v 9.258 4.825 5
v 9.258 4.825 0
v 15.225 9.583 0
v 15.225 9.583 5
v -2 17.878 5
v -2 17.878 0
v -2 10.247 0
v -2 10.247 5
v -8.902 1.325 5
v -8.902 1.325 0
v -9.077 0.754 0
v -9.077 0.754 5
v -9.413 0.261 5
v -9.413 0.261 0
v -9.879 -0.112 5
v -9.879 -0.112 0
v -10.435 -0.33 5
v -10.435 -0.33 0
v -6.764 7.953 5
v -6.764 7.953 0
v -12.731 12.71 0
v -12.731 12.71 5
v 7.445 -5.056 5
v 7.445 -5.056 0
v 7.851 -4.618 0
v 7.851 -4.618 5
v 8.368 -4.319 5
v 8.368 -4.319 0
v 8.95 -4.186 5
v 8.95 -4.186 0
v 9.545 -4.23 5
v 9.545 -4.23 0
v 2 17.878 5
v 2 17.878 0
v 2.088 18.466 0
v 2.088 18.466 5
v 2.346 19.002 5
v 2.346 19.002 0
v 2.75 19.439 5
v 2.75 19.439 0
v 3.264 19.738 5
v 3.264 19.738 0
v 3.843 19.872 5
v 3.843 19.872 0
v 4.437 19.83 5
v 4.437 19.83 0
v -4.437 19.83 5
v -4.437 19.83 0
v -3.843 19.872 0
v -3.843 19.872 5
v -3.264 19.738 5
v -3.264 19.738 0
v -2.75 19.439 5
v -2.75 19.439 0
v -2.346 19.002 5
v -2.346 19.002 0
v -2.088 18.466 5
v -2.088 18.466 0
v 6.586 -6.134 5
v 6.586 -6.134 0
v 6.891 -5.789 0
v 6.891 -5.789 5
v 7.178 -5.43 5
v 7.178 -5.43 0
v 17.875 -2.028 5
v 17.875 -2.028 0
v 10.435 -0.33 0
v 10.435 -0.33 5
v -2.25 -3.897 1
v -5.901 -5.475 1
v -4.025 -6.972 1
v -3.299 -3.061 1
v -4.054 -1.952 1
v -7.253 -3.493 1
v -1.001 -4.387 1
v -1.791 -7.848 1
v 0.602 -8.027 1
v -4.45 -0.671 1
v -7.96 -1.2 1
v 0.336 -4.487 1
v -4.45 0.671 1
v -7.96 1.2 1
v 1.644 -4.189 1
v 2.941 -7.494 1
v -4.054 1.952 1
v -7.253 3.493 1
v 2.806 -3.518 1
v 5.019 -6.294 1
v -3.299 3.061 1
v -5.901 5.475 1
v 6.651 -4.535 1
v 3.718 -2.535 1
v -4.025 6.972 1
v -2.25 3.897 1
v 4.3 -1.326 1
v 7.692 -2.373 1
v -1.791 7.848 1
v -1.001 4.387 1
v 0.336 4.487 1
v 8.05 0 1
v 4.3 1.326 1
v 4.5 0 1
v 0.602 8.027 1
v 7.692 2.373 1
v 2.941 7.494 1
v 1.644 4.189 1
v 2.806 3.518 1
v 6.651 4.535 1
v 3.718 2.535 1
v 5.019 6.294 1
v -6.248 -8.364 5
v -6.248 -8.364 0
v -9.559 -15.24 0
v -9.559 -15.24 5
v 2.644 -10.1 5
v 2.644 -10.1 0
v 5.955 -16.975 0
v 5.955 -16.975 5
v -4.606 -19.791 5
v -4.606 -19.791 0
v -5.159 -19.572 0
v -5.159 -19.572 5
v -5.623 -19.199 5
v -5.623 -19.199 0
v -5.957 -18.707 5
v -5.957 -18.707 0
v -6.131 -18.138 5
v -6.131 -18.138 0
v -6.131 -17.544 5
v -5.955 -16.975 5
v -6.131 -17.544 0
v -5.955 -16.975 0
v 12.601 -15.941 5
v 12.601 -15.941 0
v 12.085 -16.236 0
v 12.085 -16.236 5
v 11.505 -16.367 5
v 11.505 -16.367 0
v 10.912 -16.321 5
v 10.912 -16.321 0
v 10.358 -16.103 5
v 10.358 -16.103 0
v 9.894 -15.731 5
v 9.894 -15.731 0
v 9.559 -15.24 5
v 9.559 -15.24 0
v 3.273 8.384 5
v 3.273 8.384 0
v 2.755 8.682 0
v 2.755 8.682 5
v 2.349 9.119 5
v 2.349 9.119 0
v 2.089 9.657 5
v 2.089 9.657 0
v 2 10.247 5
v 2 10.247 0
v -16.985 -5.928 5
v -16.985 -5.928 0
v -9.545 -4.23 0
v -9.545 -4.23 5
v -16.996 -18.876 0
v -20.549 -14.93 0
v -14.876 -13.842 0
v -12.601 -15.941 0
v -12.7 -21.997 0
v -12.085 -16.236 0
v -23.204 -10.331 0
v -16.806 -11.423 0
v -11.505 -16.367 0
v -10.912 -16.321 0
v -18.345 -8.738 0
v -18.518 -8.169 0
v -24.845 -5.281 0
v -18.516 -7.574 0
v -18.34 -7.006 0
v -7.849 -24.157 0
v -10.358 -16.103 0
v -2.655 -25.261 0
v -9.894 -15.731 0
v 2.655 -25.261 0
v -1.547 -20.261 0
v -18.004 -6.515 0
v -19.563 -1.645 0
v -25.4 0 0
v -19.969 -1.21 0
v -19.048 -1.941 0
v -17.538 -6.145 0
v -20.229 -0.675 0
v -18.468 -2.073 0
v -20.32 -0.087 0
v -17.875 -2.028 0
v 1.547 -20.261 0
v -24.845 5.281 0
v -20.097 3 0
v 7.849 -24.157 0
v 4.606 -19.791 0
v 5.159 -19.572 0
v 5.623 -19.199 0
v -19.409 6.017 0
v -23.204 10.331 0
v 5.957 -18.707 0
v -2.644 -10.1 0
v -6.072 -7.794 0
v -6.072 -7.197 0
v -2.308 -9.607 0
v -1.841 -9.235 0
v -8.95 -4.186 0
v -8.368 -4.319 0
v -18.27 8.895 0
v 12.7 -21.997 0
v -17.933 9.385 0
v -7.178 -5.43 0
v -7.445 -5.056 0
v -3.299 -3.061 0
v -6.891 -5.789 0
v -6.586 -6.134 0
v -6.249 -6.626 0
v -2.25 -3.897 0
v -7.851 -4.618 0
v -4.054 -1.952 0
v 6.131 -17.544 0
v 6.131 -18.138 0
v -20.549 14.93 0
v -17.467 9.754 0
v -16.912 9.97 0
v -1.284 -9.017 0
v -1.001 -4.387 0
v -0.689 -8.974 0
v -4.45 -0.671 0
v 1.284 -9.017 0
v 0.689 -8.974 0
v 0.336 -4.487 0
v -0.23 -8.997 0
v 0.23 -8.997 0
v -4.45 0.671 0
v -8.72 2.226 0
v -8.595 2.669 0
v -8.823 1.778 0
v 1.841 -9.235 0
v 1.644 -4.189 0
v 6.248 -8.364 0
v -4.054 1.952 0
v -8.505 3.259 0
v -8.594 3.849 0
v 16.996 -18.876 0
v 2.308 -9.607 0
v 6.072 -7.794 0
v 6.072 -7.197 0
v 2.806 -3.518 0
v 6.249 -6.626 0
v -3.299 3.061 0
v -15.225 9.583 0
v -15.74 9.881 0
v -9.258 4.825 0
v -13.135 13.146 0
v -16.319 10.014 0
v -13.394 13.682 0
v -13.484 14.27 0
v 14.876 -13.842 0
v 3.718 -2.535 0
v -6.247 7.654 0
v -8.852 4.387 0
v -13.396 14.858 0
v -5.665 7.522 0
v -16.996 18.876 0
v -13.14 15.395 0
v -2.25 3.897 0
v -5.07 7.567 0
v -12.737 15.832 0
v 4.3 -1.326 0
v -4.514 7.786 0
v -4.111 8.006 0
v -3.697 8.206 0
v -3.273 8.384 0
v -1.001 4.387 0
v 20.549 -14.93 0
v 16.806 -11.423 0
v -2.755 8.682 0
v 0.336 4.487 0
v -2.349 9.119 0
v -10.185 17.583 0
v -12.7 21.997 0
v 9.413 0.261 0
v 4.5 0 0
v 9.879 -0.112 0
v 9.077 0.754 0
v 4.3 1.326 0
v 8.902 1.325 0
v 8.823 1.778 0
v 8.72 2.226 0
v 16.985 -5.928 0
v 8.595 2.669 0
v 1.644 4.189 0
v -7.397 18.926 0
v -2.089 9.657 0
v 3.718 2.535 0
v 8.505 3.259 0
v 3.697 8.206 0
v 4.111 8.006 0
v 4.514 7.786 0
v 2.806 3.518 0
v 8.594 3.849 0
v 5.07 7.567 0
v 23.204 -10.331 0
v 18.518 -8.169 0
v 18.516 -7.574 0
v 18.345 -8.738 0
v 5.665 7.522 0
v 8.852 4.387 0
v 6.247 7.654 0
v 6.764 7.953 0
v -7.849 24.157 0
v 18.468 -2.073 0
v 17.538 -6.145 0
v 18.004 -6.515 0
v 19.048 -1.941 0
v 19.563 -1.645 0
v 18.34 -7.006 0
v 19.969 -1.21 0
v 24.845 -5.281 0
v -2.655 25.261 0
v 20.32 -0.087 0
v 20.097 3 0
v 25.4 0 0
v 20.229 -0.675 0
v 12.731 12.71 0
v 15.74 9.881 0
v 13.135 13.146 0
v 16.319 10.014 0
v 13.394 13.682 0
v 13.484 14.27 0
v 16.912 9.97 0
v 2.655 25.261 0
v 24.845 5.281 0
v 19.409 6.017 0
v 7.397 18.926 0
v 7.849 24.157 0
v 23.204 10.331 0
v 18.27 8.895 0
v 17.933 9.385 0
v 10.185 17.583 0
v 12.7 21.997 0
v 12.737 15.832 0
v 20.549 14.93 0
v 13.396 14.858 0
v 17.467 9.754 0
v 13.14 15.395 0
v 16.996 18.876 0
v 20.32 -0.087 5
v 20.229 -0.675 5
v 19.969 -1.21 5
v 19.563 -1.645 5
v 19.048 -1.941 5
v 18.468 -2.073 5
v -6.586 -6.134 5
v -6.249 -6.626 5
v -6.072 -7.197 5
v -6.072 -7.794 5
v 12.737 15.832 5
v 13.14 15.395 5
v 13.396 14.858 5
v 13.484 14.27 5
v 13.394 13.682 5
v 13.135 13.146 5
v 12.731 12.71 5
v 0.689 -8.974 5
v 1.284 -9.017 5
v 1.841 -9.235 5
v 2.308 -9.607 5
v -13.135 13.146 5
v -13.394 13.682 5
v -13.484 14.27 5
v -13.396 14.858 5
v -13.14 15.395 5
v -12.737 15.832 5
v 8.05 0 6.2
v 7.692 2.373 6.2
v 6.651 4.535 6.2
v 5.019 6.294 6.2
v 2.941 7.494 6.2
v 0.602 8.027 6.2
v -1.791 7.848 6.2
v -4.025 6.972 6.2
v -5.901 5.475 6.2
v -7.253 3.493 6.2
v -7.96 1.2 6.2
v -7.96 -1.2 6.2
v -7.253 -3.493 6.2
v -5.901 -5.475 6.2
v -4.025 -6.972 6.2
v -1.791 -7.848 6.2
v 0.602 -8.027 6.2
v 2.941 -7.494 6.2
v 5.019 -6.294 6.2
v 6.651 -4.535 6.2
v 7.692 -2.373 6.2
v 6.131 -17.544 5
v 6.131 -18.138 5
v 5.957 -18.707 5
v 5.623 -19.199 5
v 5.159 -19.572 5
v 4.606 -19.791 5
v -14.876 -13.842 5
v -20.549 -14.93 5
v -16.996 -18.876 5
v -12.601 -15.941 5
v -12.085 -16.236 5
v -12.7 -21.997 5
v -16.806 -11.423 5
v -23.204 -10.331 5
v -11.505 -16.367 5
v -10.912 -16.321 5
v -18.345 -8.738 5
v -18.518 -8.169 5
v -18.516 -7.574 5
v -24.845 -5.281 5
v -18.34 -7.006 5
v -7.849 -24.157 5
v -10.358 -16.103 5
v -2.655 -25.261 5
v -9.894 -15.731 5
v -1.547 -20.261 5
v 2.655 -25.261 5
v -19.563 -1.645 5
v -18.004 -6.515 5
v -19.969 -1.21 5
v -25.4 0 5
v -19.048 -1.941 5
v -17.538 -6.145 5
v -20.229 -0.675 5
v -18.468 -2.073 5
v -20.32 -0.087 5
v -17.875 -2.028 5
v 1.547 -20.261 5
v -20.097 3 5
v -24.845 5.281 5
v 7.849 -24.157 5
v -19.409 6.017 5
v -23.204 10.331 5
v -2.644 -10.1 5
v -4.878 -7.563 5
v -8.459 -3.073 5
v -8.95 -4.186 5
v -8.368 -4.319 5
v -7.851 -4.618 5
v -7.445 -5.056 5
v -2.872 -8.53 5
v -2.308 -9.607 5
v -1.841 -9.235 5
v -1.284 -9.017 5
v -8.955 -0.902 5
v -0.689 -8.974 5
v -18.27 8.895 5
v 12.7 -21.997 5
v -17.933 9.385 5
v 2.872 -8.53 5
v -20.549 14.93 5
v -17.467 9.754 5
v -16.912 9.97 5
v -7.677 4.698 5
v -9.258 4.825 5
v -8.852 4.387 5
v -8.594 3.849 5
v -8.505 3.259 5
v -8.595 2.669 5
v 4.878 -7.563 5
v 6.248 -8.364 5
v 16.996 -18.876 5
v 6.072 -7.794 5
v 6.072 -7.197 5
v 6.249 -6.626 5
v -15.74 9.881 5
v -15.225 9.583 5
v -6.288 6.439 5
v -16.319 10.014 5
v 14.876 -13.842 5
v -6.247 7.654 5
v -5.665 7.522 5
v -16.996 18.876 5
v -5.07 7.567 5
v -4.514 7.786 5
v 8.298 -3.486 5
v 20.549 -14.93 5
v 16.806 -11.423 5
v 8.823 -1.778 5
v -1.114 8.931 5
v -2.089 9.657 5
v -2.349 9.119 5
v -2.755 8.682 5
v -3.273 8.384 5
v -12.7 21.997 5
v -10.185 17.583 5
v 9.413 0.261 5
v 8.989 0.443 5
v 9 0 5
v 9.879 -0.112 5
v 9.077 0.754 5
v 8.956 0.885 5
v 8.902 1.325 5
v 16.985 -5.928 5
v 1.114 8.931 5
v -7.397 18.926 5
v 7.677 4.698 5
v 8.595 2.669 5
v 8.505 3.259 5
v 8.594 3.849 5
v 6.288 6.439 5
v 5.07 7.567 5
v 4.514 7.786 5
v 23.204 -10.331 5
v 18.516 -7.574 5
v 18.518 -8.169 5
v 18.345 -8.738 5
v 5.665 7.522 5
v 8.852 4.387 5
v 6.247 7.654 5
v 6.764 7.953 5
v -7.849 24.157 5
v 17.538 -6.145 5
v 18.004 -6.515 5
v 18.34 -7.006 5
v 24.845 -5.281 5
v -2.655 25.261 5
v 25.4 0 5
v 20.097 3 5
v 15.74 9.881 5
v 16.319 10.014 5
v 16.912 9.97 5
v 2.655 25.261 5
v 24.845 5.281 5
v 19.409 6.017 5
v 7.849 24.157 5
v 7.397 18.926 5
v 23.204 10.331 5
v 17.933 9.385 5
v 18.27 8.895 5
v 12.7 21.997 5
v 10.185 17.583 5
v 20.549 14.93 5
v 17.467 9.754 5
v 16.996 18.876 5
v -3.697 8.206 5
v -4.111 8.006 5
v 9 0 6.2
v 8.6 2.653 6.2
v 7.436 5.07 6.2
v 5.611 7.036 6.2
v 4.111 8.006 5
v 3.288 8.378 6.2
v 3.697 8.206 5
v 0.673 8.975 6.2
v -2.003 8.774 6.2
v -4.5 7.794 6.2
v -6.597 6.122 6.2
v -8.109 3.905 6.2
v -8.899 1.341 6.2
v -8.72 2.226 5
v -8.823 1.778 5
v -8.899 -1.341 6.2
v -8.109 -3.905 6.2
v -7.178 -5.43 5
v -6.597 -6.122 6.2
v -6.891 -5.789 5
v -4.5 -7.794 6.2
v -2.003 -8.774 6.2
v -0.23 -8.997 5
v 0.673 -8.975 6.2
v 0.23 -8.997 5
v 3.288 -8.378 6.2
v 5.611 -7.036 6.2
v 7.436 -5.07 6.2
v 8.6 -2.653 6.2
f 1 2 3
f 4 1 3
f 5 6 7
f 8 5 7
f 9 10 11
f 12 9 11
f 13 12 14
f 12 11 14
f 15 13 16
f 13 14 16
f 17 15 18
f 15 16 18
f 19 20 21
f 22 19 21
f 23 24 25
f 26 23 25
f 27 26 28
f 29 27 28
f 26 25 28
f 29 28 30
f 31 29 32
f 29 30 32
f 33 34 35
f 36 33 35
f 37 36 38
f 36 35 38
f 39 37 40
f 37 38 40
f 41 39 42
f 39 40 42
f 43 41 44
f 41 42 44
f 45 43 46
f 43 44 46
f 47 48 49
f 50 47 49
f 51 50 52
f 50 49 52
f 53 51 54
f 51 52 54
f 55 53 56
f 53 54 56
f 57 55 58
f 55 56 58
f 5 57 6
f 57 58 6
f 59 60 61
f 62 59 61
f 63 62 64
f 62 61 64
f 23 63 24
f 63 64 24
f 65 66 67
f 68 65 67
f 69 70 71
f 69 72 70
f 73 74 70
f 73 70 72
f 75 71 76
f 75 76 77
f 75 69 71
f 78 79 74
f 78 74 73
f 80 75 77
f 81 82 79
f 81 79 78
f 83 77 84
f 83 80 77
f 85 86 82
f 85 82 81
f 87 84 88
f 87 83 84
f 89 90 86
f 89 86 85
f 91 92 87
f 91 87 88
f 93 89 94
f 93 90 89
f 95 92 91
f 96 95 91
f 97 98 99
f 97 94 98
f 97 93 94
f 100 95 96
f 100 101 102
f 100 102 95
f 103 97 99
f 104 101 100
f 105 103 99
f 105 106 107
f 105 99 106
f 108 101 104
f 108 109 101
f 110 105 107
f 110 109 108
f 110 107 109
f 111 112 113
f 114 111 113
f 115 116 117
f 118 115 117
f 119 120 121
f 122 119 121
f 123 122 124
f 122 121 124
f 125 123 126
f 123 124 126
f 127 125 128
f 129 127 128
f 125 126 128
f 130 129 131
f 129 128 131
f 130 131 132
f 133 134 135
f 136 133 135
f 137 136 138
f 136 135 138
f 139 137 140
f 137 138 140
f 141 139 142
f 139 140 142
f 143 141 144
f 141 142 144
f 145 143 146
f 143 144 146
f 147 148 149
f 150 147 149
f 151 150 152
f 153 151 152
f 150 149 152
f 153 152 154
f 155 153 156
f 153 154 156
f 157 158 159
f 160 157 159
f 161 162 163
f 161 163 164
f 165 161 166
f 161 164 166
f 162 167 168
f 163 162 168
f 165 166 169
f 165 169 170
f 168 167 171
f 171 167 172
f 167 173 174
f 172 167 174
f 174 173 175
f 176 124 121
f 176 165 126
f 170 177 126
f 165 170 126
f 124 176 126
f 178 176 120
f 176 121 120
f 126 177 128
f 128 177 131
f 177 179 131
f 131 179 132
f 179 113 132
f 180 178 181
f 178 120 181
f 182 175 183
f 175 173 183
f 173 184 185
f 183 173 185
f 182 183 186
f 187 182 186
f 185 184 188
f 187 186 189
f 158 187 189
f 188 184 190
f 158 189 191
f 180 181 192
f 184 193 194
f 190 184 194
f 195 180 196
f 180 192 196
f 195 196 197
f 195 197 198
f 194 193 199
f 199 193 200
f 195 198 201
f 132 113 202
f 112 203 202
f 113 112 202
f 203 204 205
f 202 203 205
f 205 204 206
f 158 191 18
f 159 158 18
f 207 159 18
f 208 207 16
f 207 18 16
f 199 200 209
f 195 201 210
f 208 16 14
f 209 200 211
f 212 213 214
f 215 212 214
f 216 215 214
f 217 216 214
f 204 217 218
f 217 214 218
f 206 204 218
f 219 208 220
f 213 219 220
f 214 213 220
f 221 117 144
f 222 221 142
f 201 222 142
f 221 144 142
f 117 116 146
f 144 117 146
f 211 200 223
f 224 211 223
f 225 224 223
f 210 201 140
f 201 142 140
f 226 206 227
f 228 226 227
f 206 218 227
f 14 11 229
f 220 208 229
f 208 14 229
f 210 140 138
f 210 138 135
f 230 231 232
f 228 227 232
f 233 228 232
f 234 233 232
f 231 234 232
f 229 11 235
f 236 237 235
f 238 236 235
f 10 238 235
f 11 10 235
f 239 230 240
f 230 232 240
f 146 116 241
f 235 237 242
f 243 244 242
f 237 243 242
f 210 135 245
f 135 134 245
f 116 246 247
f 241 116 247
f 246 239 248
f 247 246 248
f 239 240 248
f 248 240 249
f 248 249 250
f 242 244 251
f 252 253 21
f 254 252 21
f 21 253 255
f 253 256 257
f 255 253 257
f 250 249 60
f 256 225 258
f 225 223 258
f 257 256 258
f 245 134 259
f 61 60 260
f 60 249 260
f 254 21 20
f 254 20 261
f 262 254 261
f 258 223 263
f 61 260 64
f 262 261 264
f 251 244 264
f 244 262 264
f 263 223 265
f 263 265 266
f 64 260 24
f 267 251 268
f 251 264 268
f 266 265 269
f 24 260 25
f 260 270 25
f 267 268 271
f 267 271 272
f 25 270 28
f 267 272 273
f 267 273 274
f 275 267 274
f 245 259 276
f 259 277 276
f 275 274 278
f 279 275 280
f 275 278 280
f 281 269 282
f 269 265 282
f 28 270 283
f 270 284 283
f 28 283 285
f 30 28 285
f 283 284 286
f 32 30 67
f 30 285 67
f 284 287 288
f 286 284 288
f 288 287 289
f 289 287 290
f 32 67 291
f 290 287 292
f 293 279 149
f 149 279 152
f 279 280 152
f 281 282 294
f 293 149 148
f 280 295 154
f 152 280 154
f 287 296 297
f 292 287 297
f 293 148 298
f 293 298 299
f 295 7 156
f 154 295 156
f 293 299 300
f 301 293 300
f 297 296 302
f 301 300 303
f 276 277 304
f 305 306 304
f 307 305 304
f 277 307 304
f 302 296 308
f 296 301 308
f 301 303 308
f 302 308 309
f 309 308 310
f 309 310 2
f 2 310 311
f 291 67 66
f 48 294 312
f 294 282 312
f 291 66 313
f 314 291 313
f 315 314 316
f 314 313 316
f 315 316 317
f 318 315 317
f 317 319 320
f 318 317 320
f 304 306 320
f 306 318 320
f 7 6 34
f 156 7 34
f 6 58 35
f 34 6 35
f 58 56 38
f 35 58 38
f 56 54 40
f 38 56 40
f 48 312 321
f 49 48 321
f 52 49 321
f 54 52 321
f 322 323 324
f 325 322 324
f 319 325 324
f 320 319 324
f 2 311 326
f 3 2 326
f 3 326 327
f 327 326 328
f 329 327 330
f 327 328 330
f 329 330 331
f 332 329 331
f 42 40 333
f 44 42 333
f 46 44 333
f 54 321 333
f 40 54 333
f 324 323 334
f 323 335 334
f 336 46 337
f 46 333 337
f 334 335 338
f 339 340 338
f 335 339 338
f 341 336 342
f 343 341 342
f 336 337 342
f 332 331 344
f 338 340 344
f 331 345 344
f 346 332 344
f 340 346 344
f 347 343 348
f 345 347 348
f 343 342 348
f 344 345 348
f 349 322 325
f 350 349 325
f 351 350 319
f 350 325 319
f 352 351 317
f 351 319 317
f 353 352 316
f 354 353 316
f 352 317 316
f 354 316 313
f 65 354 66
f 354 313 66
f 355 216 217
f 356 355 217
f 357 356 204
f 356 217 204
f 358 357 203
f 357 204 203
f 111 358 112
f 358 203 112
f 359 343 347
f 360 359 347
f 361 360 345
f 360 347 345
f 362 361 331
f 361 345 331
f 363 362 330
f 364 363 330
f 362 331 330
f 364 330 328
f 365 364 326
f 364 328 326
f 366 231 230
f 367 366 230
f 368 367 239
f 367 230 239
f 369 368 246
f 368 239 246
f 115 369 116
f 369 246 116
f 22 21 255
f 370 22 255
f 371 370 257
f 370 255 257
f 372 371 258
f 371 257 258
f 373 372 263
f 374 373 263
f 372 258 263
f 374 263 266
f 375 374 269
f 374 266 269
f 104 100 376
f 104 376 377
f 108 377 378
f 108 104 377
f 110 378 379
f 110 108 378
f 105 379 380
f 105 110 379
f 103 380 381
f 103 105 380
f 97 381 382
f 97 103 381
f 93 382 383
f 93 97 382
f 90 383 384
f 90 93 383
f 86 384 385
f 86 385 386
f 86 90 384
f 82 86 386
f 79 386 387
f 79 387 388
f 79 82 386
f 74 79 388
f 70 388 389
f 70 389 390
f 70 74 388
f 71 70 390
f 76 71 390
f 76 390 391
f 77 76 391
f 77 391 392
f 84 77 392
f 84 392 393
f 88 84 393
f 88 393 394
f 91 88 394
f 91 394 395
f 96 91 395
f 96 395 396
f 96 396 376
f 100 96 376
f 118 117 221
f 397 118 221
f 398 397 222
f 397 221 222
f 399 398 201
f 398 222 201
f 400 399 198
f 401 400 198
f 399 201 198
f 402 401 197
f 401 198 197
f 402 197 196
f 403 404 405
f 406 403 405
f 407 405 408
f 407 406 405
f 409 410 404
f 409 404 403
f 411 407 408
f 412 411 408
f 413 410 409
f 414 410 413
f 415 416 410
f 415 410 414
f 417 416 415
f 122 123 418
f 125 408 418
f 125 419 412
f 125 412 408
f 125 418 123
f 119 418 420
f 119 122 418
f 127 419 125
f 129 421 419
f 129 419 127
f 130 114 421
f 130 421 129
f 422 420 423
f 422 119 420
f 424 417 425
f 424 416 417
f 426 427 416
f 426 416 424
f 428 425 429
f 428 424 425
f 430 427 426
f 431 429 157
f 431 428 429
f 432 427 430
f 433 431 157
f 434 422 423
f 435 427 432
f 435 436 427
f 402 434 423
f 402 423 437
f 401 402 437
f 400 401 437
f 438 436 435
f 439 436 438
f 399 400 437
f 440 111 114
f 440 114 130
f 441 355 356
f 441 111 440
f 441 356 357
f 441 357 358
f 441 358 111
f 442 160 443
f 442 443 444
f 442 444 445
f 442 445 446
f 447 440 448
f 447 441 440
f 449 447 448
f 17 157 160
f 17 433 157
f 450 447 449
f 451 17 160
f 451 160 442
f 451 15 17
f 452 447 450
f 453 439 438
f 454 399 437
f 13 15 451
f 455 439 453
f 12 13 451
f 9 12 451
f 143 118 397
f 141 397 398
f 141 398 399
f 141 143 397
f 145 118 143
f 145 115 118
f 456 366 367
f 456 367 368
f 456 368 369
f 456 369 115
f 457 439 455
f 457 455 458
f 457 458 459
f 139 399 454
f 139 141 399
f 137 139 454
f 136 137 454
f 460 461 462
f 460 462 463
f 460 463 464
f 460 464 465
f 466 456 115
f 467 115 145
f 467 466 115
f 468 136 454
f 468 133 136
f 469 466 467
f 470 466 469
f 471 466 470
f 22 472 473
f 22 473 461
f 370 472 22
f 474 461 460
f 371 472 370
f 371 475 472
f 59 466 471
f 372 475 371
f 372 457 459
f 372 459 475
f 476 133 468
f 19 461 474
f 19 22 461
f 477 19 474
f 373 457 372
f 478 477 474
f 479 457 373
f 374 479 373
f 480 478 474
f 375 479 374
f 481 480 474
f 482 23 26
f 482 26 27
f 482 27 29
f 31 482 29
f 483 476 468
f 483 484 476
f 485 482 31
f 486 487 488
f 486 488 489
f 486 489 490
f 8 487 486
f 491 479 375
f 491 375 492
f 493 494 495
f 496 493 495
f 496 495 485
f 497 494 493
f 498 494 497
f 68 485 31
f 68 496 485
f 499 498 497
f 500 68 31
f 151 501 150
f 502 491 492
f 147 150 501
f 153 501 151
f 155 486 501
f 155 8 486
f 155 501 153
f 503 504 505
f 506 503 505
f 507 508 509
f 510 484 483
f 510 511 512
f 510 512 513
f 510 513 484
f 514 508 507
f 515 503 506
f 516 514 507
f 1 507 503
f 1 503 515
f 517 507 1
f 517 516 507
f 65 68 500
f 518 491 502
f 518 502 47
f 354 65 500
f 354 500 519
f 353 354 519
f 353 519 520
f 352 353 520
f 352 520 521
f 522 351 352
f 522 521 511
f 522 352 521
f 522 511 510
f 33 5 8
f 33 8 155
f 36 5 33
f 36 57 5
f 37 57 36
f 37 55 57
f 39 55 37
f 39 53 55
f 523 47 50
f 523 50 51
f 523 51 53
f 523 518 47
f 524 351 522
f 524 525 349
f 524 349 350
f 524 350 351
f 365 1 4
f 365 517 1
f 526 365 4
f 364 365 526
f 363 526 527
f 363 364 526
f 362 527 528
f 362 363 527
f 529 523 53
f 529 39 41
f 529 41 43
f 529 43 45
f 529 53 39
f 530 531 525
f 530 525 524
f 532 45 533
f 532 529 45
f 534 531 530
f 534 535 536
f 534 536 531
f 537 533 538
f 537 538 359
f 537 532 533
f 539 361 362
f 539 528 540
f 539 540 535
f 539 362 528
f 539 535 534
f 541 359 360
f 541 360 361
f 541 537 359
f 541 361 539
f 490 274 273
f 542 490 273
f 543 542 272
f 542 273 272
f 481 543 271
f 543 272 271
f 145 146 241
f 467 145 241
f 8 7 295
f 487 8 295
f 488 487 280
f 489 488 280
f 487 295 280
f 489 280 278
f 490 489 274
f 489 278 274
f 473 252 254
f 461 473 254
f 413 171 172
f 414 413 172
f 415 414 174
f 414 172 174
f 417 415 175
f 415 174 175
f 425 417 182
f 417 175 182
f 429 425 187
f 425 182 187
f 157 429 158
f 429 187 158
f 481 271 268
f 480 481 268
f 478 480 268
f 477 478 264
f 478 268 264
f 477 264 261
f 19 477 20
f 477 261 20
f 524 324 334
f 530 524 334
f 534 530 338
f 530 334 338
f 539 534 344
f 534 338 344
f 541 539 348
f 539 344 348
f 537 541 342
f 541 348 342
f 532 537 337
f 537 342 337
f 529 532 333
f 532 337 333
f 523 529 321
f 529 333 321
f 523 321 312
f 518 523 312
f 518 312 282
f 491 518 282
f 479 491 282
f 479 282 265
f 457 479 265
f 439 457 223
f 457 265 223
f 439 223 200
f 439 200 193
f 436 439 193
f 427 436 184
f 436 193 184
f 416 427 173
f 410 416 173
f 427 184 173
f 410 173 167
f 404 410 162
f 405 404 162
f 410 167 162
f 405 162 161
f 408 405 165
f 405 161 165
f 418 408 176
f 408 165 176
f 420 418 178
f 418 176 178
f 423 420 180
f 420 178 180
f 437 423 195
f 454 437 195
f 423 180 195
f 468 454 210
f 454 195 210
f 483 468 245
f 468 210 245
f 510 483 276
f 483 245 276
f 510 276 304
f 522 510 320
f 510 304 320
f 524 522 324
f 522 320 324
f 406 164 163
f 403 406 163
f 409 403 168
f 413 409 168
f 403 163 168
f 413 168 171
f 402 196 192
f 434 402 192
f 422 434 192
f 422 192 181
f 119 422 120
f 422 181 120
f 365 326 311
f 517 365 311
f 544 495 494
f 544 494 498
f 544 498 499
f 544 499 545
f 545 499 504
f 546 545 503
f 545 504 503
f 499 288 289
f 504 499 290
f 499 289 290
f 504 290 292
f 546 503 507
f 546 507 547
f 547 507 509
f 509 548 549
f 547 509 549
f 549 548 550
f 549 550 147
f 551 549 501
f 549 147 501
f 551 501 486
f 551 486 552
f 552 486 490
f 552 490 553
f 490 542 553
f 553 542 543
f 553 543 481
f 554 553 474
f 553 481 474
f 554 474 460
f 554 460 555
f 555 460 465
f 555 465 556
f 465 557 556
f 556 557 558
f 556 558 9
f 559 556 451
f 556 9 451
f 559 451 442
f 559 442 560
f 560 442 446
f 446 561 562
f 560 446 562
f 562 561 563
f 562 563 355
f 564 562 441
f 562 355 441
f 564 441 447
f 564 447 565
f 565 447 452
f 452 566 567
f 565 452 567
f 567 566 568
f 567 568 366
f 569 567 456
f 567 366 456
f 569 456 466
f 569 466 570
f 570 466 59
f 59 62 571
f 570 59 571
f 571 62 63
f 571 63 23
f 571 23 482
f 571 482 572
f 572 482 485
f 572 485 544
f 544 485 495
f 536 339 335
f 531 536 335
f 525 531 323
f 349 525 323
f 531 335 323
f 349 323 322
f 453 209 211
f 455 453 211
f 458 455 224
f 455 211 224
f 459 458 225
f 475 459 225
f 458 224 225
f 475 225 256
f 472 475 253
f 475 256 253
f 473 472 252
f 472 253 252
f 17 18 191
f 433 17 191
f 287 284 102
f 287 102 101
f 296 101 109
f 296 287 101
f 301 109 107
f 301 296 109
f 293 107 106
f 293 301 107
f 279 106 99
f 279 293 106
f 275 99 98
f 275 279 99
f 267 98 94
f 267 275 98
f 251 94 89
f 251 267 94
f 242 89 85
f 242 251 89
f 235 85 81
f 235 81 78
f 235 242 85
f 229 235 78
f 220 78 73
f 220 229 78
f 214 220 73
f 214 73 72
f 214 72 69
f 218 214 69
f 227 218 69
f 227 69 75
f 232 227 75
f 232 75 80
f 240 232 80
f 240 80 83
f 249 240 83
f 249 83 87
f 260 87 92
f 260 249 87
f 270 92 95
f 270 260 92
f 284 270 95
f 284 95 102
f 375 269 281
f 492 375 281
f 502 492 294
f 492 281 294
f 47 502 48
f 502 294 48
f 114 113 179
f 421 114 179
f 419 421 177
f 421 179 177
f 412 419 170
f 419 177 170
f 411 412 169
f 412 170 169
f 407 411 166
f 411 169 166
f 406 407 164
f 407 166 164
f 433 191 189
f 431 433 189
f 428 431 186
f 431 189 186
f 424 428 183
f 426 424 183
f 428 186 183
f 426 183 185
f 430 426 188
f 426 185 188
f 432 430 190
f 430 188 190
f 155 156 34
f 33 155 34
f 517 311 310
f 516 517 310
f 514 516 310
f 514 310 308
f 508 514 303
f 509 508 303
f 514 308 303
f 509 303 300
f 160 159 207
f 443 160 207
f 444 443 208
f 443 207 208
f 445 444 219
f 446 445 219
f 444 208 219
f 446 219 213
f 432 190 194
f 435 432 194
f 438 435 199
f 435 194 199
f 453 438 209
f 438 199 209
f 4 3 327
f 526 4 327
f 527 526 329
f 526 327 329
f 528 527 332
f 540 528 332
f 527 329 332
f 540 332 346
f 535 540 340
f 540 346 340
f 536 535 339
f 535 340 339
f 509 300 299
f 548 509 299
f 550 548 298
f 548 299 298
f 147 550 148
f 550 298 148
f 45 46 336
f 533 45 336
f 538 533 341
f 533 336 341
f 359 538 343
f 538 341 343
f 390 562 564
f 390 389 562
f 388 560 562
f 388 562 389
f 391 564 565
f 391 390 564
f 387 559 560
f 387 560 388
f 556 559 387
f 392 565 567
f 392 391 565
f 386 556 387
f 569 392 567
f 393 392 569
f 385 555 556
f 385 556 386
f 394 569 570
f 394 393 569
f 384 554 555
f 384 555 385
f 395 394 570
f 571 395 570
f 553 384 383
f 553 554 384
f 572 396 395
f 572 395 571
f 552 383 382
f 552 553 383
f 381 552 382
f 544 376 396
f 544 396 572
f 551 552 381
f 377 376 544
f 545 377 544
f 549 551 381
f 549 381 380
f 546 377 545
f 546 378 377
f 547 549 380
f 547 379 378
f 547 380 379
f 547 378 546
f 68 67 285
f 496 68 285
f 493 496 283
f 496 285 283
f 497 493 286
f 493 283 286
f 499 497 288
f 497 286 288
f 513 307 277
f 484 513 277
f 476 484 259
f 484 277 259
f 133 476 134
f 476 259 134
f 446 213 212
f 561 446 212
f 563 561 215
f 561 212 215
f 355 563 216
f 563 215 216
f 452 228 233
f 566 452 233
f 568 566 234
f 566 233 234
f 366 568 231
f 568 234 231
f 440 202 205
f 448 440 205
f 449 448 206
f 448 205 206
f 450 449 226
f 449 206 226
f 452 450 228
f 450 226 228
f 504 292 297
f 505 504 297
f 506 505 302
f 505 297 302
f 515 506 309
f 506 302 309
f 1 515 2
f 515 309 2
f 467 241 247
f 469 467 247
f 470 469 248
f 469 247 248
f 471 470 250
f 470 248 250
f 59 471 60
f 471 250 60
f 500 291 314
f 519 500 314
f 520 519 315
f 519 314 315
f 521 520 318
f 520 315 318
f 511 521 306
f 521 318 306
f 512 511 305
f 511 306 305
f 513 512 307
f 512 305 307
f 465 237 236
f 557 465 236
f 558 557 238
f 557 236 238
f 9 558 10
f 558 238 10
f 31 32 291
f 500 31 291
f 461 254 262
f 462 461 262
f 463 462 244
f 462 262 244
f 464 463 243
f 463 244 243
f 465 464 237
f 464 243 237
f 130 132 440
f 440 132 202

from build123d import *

# Parameters (mm, degrees)
F0_R     = 25.4
F0_R_2   = 8.1
F2_DEPTH = 5
F1_R     = 8.05
F1_R_2   = 4.5
F3_DEPTH = 1
F1_R_3   = 9
F4_DEPTH = 6.2


with BuildPart() as f2:
    # F0 (on Top) → F2 (new body)
    with BuildSketch(Plane.XY):
        Circle(F0_R)
        with BuildLine():
            ThreePointArc((-4.606486482, -19.7909747686), (-5.9568852552, -18.7069483477), (-5.955029879, -16.9752767029))
            Line((-5.955029879, -16.9752767029), (-2.6440475771, -10.0999511093))
            ThreePointArc((-2.6440475771, -10.0999511093), (-1.8405240839, -9.2347532099), (-0.688998961, -8.9735879353))
            ThreePointArc((-0.688998961, -8.9735879353), (0, -9), (0.688998961, -8.9735879353))
            ThreePointArc((0.688998961, -8.9735879353), (1.8405240839, -9.2347532099), (2.6440475771, -10.0999511093))
            Line((2.6440475771, -10.0999511093), (5.955029879, -16.9752767029))
            ThreePointArc((5.955029879, -16.9752767029), (5.9568852552, -18.7069483477), (4.606486482, -19.7909747686))
            ThreePointArc((4.606486482, -19.7909747686), (0, -20.32), (-4.606486482, -19.7909747686))
        make_face(mode=Mode.SUBTRACT)
        with BuildLine():
            ThreePointArc((-18.3453044867, -8.7379747819), (-18.3397383666, -7.0063110887), (-16.9847061493, -5.9280820695))
            Line((-16.9847061493, -5.9280820695), (-9.5449964486, -4.230016879))
            ThreePointArc((-9.5449964486, -4.230016879), (-8.3675687887, -4.318794776), (-7.4454173842, -5.0562594846))
            ThreePointArc((-7.4454173842, -5.0562594846), (-7.0364833422, -5.6114082167), (-6.5862497328, -6.1336216428))
            ThreePointArc((-6.5862497328, -6.1336216428), (-6.0724727959, -7.1967541221), (-6.2479230487, -8.3644161528))
            Line((-6.2479230487, -8.3644161528), (-9.5589053506, -15.2397417464))
            ThreePointArc((-9.5589053506, -15.2397417464), (-10.9116239517, -16.3208719487), (-12.6011097989, -15.9409670922))
            ThreePointArc((-12.6011097989, -15.9409670922), (-15.8868157238, -12.6693127738), (-18.3453044867, -8.7379747819))
        make_face(mode=Mode.SUBTRACT)
        Circle(F0_R_2, mode=Mode.SUBTRACT)
        with BuildLine():
            ThreePointArc((12.6011097989, -15.9409670922), (10.9116239517, -16.3208719487), (9.5589053506, -15.2397417464))
            Line((9.5589053506, -15.2397417464), (6.2479230487, -8.3644161528))
            ThreePointArc((6.2479230487, -8.3644161528), (6.0724727959, -7.1967541221), (6.5862497328, -6.1336216428))
            ThreePointArc((6.5862497328, -6.1336216428), (7.0364833422, -5.6114082167), (7.4454173842, -5.0562594846))
            ThreePointArc((7.4454173842, -5.0562594846), (8.3675687887, -4.318794776), (9.5449964486, -4.230016879))
            Line((9.5449964486, -4.230016879), (16.9847061493, -5.9280820695))
            ThreePointArc((16.9847061493, -5.9280820695), (18.3397383666, -7.0063110887), (18.3453044867, -8.7379747819))
            ThreePointArc((18.3453044867, -8.7379747819), (15.8868157238, -12.6693127738), (12.6011097989, -15.9409670922))
        make_face(mode=Mode.SUBTRACT)
        with BuildLine():
            ThreePointArc((-18.269734037, 8.8948984378), (-16.9123944255, 9.9702213228), (-15.2245522643, 9.583079273))
            Line((-15.2245522643, 9.583079273), (-9.2583683118, 4.8252063378))
            ThreePointArc((-9.2583683118, 4.8252063378), (-8.5936635283, 3.8493042116), (-8.5952846582, 2.6685354869))
            ThreePointArc((-8.5952846582, 2.6685354869), (-8.7743512096, 2.0026884056), (-8.9019180428, 1.3250868497))
            ThreePointArc((-8.9019180428, 1.3250868497), (-9.4127738045, 0.2605476067), (-10.4350801844, -0.3303052303))
            Line((-10.4350801844, -0.3303052303), (-17.8747898851, -2.0283704208))
            ThreePointArc((-17.8747898851, -2.0283704208), (-19.5634577664, -1.6448460872), (-20.3198133854, -0.087086059))
            ThreePointArc((-20.3198133854, -0.087086059), (-19.8105351755, 4.521625378), (-18.269734037, 8.8948984378))
        make_face(mode=Mode.SUBTRACT)
        with BuildLine():
            ThreePointArc((-2, 10.246950766), (-2.3485543523, 9.1187986163), (-3.2727272727, 8.3838688085))
            ThreePointArc((-3.2727272727, 8.3838688085), (-3.9049536521, 8.1087198111), (-4.5142605006, 7.7859779176))
            ThreePointArc((-4.5142605006, 7.7859779176), (-5.6650641528, 7.5216516734), (-6.7644091044, 7.9525322677))
            Line((-6.7644091044, 7.9525322677), (-12.7305930568, 12.7104052029))
            ThreePointArc((-12.7305930568, 12.7104052029), (-13.4836088612, 14.2697824267), (-12.7372830441, 15.832372553))
            ThreePointArc((-12.7372830441, 15.832372553), (-8.8165175789, 18.3076873958), (-4.4366812227, 19.8297317109))
            ThreePointArc((-4.4366812227, 19.8297317109), (-2.749672532, 19.4389737228), (-2, 17.8779864638))
            Line((-2, 17.8779864638), (-2, 10.246950766))
        make_face(mode=Mode.SUBTRACT)
        with BuildLine():
            ThreePointArc((20.3198133854, -0.087086059), (19.5634577664, -1.6448460872), (17.8747898851, -2.0283704208))
            Line((17.8747898851, -2.0283704208), (10.4350801844, -0.3303052303))
            ThreePointArc((10.4350801844, -0.3303052303), (9.4127738045, 0.2605476067), (8.9019180428, 1.3250868497))
            ThreePointArc((8.9019180428, 1.3250868497), (8.7743512096, 2.0026884056), (8.5952846582, 2.6685354869))
            ThreePointArc((8.5952846582, 2.6685354869), (8.5936635283, 3.8493042116), (9.2583683118, 4.8252063378))
            Line((9.2583683118, 4.8252063378), (15.2245522643, 9.583079273))
            ThreePointArc((15.2245522643, 9.583079273), (16.9123944255, 9.9702213228), (18.269734037, 8.8948984378))
            ThreePointArc((18.269734037, 8.8948984378), (19.8105351755, 4.521625378), (20.3198133854, -0.087086059))
        make_face(mode=Mode.SUBTRACT)
        with BuildLine():
            Line((2, 10.246950766), (2, 17.8779864638))
            ThreePointArc((2, 17.8779864638), (2.749672532, 19.4389737228), (4.4366812227, 19.8297317109))
            ThreePointArc((4.4366812227, 19.8297317109), (8.8165175789, 18.3076873958), (12.7372830441, 15.832372553))
            ThreePointArc((12.7372830441, 15.832372553), (13.4836088612, 14.2697824267), (12.7305930568, 12.7104052029))
            Line((12.7305930568, 12.7104052029), (6.7644091044, 7.9525322677))
            ThreePointArc((6.7644091044, 7.9525322677), (5.6650641528, 7.5216516734), (4.5142605006, 7.7859779176))
            ThreePointArc((4.5142605006, 7.7859779176), (3.9049536521, 8.1087198111), (3.2727272727, 8.3838688085))
            ThreePointArc((3.2727272727, 8.3838688085), (2.3485543523, 9.1187986163), (2, 10.246950766))
        make_face(mode=Mode.SUBTRACT)
    extrude(amount=F2_DEPTH)



with BuildPart() as f3:
    # F1 (on face) → F3 (new body)
    with BuildSketch(Plane.XY):
        Circle(F1_R)
        Circle(F1_R_2, mode=Mode.SUBTRACT)
    extrude(amount=F3_DEPTH)


with BuildPart() as f2_1:
    add(f2.part)

    add(f3.part)  # F4 merges F3
    # F1 (on face) → F4 (join)
    with BuildSketch(Plane.XY):
        Circle(F1_R_3)
        Circle(F1_R, mode=Mode.SUBTRACT)
    extrude(amount=F4_DEPTH)


solid = f2_1.part
